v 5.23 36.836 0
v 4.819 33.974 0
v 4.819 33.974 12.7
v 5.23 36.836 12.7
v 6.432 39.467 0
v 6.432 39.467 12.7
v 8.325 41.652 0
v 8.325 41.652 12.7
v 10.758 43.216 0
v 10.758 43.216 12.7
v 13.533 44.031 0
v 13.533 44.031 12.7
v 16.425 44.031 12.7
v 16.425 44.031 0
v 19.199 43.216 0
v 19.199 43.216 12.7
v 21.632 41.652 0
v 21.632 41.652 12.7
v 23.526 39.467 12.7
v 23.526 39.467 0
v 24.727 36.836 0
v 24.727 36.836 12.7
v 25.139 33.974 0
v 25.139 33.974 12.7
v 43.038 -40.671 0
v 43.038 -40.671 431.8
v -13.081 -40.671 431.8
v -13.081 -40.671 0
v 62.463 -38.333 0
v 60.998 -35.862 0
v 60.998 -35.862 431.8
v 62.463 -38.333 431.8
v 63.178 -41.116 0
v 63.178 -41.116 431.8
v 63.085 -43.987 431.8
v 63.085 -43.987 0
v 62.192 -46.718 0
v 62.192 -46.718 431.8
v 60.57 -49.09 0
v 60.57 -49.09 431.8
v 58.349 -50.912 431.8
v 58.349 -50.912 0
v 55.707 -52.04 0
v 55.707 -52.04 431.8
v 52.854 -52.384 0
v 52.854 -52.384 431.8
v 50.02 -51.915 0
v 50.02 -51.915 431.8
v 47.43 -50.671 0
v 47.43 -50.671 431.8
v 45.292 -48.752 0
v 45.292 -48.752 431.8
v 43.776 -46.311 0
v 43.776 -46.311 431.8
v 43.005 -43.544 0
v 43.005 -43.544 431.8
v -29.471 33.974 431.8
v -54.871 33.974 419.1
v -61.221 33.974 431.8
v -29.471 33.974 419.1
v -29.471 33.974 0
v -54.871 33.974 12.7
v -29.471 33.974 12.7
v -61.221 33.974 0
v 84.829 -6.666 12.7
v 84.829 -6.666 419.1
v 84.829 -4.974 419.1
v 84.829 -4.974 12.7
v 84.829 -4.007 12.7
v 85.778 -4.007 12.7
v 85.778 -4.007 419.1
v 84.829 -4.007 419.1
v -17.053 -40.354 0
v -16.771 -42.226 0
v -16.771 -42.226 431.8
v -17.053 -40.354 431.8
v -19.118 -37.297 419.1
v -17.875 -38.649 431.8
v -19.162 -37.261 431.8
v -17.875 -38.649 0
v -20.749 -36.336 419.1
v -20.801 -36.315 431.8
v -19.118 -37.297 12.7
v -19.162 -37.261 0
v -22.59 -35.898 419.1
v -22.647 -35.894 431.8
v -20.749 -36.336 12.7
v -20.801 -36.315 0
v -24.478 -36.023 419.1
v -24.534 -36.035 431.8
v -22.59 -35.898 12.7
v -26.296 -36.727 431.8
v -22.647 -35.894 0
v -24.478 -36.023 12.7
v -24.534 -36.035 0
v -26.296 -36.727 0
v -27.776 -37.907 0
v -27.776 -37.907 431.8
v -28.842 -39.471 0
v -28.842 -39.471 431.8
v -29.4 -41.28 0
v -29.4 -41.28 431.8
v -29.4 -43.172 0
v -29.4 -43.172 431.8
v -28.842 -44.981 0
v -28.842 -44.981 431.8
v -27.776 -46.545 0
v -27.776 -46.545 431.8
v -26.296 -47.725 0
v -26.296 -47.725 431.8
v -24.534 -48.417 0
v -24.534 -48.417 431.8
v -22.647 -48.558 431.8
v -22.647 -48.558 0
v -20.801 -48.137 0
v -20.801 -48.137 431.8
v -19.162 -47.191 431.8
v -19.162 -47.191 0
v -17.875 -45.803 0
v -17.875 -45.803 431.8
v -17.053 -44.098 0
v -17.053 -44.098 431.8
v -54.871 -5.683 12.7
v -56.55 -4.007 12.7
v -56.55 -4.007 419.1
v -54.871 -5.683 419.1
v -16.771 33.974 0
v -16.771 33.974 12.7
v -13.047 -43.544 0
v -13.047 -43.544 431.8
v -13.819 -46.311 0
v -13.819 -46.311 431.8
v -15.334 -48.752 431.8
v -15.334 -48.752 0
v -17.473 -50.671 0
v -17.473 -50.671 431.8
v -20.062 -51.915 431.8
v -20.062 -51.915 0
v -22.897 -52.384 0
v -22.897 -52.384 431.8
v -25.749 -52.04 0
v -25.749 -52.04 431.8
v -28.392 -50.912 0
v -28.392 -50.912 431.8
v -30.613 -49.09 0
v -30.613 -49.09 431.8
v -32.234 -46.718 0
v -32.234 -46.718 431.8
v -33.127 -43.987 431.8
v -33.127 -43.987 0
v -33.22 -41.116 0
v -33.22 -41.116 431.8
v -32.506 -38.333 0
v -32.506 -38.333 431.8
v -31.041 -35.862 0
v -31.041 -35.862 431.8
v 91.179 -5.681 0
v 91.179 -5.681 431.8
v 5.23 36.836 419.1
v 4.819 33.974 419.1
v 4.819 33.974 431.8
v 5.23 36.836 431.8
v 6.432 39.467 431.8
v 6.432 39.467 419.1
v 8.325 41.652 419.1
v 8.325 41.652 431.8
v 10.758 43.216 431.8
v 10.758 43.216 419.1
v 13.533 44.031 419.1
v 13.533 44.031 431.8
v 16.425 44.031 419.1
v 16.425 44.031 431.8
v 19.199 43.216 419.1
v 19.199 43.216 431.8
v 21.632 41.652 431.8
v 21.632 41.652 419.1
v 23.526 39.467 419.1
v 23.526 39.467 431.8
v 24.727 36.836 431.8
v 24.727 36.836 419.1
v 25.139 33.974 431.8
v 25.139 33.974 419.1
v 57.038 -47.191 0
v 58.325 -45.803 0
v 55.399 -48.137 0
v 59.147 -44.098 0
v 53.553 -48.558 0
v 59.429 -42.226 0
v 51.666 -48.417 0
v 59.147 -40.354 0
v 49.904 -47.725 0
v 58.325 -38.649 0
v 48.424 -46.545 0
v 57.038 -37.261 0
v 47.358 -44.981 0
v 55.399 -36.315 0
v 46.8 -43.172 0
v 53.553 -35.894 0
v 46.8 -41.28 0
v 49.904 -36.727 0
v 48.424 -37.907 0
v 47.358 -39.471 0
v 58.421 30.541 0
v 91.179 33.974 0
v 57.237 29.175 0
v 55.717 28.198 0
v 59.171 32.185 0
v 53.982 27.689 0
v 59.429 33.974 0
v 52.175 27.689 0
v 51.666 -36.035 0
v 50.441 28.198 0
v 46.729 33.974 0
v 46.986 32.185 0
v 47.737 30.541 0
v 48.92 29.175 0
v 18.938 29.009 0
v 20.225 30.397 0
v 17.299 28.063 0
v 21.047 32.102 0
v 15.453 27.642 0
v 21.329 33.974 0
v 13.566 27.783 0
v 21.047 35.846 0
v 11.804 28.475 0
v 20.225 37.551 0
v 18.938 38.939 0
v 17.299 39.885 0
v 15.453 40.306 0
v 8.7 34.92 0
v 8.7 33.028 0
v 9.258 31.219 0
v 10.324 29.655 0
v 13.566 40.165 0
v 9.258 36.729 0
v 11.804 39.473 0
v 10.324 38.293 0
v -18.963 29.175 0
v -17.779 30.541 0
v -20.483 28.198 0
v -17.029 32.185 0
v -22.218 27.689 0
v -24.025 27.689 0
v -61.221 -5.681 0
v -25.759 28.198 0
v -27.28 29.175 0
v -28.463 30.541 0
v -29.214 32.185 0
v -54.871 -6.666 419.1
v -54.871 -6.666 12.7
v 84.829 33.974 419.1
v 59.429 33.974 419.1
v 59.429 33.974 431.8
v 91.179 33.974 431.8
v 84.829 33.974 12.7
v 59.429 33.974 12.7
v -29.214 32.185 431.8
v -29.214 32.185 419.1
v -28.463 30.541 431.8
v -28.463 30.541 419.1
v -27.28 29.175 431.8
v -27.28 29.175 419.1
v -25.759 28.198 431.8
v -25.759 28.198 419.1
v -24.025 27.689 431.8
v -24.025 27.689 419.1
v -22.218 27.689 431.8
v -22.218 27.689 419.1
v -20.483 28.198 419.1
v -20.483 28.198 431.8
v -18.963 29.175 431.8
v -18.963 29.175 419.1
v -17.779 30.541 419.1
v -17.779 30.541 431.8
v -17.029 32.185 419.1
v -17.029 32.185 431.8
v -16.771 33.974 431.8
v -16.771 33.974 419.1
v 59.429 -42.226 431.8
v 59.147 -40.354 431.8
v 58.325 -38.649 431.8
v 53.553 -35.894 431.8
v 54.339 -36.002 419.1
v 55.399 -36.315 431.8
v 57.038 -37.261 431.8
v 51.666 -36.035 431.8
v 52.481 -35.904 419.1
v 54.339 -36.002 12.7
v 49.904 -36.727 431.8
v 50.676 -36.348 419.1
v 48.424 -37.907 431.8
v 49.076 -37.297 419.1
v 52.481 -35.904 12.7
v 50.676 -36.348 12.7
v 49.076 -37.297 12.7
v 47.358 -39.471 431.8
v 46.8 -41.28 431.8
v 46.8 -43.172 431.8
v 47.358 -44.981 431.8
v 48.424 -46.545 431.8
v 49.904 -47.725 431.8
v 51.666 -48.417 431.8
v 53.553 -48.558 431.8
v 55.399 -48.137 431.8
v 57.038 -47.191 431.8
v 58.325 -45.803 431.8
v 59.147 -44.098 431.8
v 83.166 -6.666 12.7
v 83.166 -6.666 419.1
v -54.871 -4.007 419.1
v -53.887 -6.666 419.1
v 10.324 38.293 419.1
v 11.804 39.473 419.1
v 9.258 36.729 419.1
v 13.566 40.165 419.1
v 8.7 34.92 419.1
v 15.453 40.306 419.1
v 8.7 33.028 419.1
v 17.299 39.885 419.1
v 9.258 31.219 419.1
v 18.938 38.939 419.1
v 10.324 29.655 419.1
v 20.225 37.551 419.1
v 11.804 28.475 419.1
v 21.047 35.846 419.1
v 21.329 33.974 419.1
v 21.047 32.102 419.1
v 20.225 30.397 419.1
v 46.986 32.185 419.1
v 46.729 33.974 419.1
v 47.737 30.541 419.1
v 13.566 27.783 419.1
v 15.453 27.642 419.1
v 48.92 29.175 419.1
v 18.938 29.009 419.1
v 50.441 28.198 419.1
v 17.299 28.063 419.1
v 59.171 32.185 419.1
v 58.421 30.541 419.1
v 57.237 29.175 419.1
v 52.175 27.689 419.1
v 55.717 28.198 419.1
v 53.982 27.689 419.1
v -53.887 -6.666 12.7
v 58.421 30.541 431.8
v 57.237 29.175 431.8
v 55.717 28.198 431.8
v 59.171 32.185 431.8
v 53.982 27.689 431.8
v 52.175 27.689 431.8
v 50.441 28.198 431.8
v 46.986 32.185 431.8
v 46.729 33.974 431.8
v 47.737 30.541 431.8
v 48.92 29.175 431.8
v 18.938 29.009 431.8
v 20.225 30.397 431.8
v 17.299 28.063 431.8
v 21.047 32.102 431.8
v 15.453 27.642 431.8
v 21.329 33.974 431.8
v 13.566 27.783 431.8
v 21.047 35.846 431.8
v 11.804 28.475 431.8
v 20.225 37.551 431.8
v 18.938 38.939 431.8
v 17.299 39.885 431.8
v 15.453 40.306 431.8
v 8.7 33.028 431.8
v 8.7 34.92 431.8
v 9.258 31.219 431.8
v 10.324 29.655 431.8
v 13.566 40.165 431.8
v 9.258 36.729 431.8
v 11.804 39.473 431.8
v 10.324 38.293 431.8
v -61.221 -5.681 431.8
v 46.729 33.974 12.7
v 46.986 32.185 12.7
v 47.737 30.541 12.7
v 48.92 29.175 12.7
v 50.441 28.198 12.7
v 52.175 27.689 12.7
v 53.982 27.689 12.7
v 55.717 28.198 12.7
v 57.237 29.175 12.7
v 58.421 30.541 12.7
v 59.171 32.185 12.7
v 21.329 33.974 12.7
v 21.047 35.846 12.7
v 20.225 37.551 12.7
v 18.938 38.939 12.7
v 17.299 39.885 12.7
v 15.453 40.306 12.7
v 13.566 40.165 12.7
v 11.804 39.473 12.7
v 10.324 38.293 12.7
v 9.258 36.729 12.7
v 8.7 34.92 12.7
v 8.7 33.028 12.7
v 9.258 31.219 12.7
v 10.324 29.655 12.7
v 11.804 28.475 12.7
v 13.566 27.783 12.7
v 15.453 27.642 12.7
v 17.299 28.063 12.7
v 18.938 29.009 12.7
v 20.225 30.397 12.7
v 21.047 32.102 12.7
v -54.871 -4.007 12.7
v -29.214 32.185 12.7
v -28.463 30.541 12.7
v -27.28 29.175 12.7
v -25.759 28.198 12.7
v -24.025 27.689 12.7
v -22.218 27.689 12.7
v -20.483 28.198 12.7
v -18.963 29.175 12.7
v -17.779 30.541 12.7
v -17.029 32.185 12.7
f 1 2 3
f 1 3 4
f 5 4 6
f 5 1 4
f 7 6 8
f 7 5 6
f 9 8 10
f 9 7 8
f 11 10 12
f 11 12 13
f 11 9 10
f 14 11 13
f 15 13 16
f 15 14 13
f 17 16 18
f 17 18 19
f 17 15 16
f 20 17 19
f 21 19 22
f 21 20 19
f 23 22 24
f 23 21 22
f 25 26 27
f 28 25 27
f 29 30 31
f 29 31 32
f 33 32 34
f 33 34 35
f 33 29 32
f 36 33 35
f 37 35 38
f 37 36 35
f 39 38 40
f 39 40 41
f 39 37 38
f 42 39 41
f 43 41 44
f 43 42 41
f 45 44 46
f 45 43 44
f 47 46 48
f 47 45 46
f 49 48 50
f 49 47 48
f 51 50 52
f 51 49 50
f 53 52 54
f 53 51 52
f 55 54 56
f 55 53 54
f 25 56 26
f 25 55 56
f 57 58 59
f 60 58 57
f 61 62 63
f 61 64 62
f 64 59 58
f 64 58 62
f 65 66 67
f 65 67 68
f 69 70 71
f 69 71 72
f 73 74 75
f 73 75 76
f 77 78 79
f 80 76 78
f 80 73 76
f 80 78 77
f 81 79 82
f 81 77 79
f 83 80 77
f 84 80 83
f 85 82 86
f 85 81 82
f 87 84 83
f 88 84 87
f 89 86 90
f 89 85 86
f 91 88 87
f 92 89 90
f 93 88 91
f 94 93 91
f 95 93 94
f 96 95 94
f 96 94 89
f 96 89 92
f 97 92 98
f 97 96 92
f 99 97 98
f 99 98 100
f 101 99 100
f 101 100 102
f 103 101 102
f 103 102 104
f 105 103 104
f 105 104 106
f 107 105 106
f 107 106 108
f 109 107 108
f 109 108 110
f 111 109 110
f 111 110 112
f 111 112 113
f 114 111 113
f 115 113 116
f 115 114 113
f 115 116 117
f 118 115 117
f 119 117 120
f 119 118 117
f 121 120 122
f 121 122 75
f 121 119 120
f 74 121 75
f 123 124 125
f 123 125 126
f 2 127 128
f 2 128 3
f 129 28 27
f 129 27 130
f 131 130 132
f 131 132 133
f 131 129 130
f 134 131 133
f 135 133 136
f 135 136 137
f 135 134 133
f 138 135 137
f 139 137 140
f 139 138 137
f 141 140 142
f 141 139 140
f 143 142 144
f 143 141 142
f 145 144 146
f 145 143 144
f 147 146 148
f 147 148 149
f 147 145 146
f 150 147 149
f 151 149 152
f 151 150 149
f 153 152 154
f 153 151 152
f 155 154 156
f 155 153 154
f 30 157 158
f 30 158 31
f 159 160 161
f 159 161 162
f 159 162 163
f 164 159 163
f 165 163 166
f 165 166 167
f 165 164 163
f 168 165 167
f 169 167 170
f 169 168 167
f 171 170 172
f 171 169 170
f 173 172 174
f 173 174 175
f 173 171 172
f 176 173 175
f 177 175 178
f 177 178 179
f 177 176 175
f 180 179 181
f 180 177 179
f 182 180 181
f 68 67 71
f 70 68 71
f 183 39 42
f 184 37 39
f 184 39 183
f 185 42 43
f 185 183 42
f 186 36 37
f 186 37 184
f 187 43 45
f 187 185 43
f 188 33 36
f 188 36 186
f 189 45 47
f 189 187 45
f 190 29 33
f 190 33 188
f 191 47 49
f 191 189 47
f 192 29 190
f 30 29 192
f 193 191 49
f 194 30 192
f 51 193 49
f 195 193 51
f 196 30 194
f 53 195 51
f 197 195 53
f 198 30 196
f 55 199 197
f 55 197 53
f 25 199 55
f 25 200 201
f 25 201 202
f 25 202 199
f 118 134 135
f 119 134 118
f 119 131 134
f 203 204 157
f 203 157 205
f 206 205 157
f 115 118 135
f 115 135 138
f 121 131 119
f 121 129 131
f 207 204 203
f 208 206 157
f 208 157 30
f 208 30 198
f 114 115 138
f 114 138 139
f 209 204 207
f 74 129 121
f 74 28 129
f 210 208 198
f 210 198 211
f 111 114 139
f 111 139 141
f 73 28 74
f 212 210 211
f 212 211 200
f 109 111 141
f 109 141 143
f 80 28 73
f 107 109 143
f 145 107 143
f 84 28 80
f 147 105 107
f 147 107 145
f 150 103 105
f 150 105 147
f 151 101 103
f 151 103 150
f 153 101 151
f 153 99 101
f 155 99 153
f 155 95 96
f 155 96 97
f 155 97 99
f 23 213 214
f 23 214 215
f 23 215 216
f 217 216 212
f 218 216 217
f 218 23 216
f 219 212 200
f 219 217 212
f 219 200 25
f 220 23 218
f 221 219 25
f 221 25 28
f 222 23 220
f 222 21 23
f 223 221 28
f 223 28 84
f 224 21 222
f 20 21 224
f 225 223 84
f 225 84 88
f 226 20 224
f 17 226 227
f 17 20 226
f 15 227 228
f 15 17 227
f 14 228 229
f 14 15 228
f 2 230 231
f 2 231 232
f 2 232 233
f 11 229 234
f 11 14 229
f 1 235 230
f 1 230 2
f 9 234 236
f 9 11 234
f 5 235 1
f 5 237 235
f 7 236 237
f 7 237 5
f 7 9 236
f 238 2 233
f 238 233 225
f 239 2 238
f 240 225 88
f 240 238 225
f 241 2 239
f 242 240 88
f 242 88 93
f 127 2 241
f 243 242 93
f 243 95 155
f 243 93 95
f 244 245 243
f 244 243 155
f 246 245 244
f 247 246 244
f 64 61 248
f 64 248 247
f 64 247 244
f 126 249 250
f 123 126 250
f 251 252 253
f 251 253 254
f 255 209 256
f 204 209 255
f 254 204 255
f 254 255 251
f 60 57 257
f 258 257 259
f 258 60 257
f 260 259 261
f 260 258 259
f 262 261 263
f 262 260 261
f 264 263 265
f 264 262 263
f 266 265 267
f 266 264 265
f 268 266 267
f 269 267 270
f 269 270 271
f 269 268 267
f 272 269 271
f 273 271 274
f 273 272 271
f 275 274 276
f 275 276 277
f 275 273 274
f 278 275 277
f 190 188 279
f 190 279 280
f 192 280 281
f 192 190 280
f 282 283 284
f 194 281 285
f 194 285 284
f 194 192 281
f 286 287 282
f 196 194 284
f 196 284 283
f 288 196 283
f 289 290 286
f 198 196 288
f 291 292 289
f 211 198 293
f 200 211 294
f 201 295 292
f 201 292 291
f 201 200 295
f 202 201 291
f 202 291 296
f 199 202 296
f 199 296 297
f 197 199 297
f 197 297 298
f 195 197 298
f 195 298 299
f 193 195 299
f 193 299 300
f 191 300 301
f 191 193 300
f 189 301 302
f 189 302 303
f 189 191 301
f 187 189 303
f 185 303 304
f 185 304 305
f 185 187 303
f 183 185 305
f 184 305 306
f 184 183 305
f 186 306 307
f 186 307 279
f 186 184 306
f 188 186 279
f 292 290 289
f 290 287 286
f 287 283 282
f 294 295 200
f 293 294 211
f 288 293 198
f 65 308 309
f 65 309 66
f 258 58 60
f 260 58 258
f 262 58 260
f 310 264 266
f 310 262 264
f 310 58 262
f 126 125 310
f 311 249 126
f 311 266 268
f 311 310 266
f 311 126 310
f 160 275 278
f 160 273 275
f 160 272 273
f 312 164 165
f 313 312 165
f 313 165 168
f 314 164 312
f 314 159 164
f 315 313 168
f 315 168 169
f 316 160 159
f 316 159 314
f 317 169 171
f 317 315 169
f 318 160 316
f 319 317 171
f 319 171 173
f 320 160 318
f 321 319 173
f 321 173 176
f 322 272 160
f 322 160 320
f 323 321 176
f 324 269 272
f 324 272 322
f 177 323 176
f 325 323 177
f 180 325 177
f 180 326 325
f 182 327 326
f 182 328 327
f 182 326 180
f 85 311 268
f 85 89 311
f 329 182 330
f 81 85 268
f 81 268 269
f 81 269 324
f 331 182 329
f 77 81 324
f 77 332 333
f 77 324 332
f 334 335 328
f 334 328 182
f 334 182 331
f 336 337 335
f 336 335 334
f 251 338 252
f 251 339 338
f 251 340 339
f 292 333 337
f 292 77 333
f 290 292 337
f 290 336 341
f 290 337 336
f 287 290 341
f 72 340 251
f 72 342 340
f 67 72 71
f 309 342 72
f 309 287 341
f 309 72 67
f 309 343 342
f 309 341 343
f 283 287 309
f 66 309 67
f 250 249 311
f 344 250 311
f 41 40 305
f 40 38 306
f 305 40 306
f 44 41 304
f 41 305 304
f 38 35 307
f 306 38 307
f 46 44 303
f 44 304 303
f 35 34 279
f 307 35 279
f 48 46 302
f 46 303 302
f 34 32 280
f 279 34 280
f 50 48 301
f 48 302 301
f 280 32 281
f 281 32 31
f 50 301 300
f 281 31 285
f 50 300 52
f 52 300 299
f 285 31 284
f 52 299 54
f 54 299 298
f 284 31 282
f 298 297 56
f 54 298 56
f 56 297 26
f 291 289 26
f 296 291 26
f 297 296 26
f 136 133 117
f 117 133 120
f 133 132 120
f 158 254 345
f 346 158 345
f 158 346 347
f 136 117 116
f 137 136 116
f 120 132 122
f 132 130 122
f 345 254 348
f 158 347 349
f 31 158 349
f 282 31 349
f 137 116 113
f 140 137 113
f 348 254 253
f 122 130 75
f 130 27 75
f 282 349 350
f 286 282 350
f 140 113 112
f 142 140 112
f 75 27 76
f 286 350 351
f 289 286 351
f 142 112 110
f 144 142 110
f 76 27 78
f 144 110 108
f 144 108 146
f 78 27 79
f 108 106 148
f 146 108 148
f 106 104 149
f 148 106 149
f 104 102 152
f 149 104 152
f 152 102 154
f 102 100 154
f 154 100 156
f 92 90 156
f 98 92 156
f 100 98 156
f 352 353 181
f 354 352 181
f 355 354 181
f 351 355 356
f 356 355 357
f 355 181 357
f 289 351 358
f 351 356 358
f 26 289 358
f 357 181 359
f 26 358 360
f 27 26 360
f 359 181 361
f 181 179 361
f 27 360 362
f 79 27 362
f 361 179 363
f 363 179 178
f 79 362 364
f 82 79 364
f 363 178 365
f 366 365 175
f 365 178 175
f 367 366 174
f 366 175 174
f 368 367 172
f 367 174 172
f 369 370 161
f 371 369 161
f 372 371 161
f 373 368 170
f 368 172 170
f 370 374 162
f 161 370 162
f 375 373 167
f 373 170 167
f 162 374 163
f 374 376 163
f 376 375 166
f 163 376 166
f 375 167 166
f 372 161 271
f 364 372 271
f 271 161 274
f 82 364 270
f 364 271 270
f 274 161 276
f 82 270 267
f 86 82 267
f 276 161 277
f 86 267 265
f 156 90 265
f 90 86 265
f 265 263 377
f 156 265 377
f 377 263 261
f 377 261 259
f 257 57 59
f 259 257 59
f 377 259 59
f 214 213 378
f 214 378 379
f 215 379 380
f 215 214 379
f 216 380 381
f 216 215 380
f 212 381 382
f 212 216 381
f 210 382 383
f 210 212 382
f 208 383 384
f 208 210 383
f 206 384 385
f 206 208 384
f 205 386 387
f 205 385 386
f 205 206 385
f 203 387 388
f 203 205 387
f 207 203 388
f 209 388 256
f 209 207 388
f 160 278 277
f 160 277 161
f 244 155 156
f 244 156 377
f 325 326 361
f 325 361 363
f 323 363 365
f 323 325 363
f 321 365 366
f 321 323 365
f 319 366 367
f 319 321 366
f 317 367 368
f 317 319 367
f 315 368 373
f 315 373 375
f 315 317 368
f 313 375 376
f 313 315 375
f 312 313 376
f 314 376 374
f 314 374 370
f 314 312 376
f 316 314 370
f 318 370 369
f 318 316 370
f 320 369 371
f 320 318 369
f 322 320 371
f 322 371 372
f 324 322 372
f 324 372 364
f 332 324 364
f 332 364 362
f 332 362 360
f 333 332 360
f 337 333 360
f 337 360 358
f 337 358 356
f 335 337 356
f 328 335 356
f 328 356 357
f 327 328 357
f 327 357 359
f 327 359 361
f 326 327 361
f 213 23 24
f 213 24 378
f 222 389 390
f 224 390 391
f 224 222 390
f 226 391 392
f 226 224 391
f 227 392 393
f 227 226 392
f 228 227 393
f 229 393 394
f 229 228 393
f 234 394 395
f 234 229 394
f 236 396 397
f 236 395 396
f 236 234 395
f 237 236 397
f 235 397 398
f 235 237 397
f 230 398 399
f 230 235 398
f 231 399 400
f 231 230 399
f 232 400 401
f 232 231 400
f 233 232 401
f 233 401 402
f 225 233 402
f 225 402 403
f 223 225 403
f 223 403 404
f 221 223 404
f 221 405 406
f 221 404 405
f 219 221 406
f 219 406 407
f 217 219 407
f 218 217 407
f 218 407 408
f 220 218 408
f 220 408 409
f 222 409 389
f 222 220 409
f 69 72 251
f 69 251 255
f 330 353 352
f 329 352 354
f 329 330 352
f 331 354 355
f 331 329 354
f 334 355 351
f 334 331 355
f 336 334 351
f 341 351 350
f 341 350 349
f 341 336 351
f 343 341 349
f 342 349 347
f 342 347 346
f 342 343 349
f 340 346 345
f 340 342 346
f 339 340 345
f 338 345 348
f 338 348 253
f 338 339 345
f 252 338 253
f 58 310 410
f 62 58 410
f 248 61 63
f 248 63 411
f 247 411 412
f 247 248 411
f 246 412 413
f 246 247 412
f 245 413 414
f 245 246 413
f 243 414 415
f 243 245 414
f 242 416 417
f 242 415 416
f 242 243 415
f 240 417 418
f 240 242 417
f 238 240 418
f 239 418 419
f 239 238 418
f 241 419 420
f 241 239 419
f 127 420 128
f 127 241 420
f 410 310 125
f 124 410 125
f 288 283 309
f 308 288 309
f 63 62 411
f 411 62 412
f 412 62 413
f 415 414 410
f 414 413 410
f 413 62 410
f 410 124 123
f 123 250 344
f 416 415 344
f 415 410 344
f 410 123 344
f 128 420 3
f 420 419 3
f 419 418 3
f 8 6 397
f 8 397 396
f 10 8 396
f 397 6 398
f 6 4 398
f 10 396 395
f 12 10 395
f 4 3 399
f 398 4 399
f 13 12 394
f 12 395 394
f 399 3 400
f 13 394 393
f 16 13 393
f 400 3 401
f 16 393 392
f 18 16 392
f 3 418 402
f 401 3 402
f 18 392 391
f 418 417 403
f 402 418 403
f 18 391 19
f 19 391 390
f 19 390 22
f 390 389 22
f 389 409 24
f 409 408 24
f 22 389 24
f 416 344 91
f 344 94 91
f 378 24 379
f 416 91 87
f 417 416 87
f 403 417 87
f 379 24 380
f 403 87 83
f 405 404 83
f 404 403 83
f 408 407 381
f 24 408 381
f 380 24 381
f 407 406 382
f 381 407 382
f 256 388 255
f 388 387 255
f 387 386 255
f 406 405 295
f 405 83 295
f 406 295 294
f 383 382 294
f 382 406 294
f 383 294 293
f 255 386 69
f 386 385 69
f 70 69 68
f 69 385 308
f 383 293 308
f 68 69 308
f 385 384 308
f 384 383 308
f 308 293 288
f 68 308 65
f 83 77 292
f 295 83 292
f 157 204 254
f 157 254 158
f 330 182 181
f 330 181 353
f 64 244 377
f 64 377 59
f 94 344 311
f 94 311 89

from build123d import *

# Parameters (mm, degrees)
SKETCH1_R               = 6.35
BOSS_EXTRUDE1_DEPTH     = 431.8
CUT_EXTRUDE1_DEPTH      = 12.7
CUT_EXTRUDE1_DEPTH_BACK = 40.64
SKETCH2_W               = 139.7
SKETCH2_H               = 406.4
CUT_EXTRUDE2_START      = -12.7
CUT_EXTRUDE2_DEPTH      = 406.4


with BuildPart() as part:
    # Sketch1 → Boss-Extrude1 (new body)
    with BuildSketch(Plane.XY):
        with BuildLine():
            Line((-61.221298715, -5.681163946), (-61.221298715, 33.973927789))
            Line((-61.221298715, 33.973927789), (-29.471298715, 33.973927789))
            ThreePointArc((-29.471298715, 33.973927789), (-23.121298715, 27.623927789), (-16.771298715, 33.973927789))
            Line((-16.771298715, 33.973927789), (4.818701285, 33.973927789))
            ThreePointArc((4.818701285, 33.973927789), (14.978701285, 44.133927789), (25.138701285, 33.973927789))
            Line((25.138701285, 33.973927789), (46.728701285, 33.973927789))
            ThreePointArc((46.728701285, 33.973927789), (53.078701285, 27.623927789), (59.428701285, 33.973927789))
            Line((59.428701285, 33.973927789), (91.178701285, 33.973927789))
            Line((91.178701285, 33.973927789), (91.178701285, -5.681163946))
            Line((91.178701285, -5.681163946), (60.998251243, -35.861613988))
            ThreePointArc((60.998251243, -35.861613988), (55.706795467, -52.040282366), (43.038417937, -40.670980475))
            Line((43.038417937, -40.670980475), (-13.081015368, -40.670980475))
            ThreePointArc((-13.081015368, -40.670980475), (-25.749392897, -52.040282366), (-31.040848673, -35.861613988))
            Line((-31.040848673, -35.861613988), (-61.221298715, -5.681163946))
        make_face()
        with Locations((14.978701285, 33.973927789)):
            Circle(SKETCH1_R, mode=Mode.SUBTRACT)
        with Locations((53.078701285, -42.226072211)):
            Circle(SKETCH1_R, mode=Mode.SUBTRACT)
        with Locations((-23.121298715, -42.226072211)):
            Circle(SKETCH1_R, mode=Mode.SUBTRACT)
    extrude(amount=BOSS_EXTRUDE1_DEPTH)

    # Sketch2 → Cut-Extrude1 (cut, two sides: drawn at the far end of the back side and taken through both)
    with BuildSketch(Plane(origin=(0, 33.973927789, 0), x_dir=(1, 0, 0), z_dir=(0, 1, 0)).offset(-CUT_EXTRUDE1_DEPTH_BACK)):
        with Locations((14.978701285, -215.9)):
            Rectangle(SKETCH2_W, SKETCH2_H)
    extrude(amount=CUT_EXTRUDE1_DEPTH + CUT_EXTRUDE1_DEPTH_BACK, mode=Mode.SUBTRACT)

    # Sketch3 → Cut-Extrude2 (cut)
    with BuildSketch(Plane(origin=(0, 0, 0), x_dir=(-1, 0, 0), z_dir=(0, 0, -1)).offset(CUT_EXTRUDE2_START)):
        Polygon((-85.778082442, -4.007478335), (56.550022931, -4.007478335), (23.202132139, -37.296656509), (-53.066680528, -37.296656509), align=None)
    extrude(amount=-CUT_EXTRUDE2_DEPTH, mode=Mode.SUBTRACT)


solid = part.part
